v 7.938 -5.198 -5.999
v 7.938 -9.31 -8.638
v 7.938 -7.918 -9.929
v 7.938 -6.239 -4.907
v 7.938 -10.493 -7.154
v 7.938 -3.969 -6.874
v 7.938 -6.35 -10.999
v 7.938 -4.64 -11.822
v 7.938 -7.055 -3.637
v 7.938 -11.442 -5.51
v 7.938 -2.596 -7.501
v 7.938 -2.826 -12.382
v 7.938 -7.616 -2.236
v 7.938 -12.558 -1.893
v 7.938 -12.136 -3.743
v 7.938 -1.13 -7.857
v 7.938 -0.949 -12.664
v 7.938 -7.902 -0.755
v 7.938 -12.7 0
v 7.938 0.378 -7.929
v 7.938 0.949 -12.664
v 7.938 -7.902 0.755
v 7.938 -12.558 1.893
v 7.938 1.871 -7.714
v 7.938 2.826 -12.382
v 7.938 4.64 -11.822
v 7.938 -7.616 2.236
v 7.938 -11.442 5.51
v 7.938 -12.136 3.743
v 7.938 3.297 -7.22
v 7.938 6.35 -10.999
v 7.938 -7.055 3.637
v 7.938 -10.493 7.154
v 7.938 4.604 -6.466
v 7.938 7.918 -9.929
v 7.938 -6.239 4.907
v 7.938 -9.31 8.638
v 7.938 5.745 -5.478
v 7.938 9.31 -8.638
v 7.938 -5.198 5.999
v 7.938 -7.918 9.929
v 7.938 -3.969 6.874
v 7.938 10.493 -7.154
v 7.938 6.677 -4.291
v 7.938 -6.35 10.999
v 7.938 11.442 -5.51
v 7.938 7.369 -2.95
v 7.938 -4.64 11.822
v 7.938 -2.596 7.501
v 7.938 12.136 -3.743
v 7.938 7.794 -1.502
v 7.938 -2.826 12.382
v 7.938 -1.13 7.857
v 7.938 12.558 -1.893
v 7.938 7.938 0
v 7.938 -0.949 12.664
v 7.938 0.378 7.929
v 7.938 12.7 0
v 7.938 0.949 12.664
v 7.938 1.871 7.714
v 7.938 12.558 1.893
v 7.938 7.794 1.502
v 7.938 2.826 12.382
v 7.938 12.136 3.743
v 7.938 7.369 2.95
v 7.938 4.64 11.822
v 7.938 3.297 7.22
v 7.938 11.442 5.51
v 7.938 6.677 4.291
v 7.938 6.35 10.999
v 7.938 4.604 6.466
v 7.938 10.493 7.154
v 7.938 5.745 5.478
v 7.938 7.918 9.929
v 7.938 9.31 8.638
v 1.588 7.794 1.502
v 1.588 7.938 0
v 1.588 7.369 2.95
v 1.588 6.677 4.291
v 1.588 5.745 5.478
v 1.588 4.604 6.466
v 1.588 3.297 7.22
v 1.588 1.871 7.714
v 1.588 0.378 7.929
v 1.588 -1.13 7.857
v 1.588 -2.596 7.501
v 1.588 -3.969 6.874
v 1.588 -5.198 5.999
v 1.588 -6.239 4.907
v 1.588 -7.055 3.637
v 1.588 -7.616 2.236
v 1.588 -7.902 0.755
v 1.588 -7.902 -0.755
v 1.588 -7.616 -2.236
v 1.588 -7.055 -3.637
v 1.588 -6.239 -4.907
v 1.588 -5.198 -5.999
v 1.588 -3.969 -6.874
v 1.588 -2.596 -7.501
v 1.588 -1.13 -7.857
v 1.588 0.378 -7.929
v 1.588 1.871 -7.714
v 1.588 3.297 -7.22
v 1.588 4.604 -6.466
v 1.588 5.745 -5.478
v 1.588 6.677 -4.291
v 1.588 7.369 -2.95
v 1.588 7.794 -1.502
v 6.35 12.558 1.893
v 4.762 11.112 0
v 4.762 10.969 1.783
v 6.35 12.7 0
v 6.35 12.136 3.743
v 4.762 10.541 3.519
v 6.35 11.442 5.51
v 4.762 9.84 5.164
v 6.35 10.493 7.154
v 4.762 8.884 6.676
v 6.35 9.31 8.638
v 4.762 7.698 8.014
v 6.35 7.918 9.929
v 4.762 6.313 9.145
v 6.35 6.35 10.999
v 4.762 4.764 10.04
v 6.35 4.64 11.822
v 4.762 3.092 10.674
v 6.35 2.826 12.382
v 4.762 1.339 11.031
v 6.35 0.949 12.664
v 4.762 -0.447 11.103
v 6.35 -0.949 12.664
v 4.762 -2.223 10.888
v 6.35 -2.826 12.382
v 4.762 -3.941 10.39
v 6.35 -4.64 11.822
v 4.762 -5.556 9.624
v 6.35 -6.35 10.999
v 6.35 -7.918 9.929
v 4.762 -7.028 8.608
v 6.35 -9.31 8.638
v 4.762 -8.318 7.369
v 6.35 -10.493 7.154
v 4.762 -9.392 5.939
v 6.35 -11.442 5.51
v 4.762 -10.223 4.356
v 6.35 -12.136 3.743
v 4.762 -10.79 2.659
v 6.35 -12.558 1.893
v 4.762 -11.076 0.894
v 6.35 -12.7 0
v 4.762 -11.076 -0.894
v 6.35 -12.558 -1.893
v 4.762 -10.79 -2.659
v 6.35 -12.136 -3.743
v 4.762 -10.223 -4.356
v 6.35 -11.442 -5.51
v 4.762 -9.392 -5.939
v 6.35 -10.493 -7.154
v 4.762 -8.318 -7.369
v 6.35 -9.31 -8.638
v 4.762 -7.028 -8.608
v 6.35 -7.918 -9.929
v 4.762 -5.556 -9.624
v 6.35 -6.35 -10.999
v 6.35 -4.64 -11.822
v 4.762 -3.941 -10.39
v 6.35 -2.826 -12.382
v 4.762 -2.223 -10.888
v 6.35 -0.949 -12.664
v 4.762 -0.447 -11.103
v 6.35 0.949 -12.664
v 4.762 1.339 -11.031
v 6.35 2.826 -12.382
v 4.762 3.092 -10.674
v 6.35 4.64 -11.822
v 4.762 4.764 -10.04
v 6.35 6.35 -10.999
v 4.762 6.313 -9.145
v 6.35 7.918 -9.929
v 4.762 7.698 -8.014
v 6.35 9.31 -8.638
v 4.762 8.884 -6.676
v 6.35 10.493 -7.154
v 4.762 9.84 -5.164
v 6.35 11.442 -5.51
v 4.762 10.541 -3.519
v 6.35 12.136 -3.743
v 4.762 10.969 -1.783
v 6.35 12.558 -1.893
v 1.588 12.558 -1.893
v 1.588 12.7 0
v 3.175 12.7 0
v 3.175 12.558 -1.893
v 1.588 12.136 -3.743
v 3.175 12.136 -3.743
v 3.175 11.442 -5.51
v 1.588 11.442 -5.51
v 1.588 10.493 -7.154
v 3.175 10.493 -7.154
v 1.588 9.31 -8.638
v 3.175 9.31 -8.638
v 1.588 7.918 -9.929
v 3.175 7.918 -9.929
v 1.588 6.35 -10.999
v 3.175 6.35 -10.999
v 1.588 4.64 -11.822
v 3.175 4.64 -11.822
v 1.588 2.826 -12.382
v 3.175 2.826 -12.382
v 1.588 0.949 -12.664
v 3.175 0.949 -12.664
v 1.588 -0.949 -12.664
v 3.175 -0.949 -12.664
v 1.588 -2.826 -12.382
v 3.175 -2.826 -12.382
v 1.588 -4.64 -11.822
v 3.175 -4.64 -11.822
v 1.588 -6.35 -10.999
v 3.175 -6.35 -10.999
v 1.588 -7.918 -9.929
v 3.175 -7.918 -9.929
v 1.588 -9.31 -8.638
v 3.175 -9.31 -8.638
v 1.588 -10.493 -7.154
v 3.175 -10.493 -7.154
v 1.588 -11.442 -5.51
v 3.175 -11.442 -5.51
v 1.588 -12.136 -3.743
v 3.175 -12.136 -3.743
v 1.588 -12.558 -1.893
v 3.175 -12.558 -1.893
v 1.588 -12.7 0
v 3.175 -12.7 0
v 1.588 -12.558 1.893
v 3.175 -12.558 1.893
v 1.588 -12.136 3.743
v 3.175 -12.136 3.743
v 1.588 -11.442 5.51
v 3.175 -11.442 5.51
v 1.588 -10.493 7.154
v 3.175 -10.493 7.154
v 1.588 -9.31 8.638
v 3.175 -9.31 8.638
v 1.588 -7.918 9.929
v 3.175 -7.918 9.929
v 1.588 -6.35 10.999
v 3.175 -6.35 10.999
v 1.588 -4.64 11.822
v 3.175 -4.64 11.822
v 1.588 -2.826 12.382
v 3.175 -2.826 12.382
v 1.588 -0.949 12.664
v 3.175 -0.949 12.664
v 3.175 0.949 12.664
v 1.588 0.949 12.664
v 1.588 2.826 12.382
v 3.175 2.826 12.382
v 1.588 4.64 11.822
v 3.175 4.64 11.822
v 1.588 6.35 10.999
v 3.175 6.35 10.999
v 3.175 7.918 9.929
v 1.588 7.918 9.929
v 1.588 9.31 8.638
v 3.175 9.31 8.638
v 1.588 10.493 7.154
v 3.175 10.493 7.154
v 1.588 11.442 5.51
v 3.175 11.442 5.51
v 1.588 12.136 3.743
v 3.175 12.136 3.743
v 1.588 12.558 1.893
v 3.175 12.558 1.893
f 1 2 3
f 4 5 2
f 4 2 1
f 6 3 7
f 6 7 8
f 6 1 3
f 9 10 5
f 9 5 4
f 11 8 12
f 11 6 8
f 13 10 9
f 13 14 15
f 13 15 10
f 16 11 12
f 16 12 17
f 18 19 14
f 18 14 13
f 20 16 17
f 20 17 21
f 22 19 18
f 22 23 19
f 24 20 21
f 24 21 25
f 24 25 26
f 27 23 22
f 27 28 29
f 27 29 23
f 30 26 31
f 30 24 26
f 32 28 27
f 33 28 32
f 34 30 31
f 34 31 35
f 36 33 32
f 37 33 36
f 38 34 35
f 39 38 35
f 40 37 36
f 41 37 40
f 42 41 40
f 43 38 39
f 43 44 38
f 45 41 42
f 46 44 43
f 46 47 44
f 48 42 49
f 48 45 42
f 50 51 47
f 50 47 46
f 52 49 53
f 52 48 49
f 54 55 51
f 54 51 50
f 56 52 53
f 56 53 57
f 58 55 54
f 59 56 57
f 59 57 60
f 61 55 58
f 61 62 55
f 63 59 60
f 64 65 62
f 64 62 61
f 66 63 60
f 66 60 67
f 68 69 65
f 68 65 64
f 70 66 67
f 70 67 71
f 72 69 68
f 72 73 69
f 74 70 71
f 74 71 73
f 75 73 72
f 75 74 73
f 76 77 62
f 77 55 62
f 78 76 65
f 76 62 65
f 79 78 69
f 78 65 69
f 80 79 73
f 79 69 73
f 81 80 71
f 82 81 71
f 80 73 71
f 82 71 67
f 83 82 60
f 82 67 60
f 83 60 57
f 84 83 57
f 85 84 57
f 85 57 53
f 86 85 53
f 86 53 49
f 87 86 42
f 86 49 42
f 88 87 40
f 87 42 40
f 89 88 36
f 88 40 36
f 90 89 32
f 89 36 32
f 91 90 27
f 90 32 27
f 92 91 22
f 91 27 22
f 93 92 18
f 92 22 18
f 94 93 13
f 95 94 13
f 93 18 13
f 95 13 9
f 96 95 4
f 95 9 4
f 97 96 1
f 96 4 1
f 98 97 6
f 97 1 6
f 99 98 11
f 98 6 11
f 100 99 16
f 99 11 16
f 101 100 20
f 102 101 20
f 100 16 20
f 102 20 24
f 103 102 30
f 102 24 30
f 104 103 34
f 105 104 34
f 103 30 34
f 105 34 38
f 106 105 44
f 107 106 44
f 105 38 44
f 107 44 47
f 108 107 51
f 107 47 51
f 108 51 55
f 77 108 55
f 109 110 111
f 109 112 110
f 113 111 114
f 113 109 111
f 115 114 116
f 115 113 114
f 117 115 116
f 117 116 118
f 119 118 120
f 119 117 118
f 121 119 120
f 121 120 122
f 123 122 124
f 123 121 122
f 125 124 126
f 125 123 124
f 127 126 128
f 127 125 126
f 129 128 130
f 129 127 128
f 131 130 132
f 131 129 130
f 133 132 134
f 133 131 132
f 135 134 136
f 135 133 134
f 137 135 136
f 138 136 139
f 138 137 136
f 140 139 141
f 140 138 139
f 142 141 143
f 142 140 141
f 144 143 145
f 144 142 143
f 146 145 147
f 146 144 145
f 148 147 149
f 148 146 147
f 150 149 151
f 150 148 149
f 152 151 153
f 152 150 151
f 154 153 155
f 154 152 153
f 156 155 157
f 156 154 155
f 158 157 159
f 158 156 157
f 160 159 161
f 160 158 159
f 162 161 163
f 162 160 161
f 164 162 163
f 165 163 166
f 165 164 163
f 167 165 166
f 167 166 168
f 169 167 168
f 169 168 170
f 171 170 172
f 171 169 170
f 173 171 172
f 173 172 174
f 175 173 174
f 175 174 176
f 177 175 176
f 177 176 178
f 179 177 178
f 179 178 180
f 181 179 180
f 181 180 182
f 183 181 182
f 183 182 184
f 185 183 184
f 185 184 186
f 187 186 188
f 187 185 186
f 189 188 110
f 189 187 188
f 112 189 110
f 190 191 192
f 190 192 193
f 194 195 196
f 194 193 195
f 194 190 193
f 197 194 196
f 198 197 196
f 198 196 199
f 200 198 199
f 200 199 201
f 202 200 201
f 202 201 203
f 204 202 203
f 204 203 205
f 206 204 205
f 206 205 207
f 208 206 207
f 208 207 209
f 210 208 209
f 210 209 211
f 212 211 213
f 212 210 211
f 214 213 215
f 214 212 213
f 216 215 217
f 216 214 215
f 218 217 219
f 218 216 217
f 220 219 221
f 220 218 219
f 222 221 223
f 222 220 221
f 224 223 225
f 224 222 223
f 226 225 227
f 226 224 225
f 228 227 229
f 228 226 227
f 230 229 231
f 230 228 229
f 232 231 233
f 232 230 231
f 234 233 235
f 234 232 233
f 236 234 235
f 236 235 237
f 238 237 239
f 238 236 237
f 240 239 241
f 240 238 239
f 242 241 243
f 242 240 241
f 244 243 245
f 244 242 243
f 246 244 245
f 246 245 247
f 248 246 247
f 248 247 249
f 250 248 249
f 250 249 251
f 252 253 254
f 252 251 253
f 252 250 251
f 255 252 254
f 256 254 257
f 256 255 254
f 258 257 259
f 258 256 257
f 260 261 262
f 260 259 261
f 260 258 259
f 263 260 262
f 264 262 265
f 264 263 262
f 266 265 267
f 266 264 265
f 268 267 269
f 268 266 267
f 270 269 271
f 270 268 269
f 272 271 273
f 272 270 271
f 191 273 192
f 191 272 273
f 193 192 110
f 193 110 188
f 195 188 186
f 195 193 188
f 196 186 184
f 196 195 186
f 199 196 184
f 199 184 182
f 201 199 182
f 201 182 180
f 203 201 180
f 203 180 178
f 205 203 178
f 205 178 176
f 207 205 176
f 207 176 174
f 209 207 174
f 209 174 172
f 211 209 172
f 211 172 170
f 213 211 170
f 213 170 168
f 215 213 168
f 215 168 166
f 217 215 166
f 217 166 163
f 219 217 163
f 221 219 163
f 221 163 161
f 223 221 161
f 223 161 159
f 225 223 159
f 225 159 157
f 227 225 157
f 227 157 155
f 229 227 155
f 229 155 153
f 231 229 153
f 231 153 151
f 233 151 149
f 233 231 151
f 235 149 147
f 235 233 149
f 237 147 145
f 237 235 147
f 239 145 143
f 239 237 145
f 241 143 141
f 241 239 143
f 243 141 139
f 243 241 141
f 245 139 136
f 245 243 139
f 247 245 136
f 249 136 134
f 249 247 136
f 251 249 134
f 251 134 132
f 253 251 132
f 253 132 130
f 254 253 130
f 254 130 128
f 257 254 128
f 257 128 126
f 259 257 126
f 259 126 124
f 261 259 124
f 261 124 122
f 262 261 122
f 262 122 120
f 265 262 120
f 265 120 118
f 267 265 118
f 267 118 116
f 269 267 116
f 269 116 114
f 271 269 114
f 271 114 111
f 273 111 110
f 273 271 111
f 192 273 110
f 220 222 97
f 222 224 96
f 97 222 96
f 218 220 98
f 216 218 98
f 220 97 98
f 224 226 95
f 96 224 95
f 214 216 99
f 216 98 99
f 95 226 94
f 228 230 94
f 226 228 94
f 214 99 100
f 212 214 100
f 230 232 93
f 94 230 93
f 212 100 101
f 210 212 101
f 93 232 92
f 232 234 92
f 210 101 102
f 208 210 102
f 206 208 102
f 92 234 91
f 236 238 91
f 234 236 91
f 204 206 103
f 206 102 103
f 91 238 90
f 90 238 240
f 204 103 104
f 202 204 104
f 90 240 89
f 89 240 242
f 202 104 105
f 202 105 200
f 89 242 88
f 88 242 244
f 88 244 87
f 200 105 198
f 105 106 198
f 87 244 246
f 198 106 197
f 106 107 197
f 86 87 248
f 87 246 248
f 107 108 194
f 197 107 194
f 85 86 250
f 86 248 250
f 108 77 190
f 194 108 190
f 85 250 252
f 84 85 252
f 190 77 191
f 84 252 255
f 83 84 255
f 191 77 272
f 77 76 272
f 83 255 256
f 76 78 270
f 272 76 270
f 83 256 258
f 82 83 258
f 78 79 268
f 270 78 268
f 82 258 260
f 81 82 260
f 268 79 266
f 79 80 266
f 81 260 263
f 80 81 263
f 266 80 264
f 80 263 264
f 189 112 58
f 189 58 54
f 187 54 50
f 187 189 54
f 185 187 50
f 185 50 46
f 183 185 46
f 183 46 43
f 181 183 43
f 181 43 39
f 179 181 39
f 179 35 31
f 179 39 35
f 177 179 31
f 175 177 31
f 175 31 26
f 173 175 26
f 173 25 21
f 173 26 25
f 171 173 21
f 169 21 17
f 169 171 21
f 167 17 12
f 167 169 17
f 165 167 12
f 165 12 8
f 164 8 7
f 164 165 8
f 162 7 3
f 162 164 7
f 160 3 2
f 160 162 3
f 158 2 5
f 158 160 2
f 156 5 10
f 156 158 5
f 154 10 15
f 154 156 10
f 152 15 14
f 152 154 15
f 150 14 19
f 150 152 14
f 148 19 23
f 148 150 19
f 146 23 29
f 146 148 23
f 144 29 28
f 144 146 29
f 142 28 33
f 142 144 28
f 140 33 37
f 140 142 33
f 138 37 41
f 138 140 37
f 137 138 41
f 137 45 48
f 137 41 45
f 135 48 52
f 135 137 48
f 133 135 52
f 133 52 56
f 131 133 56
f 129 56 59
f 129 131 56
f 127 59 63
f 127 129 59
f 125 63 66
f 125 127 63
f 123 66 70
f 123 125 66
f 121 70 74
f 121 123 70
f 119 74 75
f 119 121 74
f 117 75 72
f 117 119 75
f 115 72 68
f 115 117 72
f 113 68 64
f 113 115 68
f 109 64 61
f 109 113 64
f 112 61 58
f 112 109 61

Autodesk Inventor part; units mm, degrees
ref_plane "YZ Plane" through (0, 0, 0) normal (1, 0, 0) x (0, 1, 0)
ref_plane "XZ Plane" through (0, 0, 0) normal (0, 1, 0) x (-1, 0, 0)
ref_plane "XY Plane" through (0, 0, 0) normal (0, 0, 1) x (1, 0, 0)
sketch "Sketch1" plane through (0, 0, 0) normal (0, 0, 1) x (1, 0, 0)
  line L0 (0, 0) -> (9.525, 0) construction
  line L1 (1.5875, 7.9375) -> (7.9375, 7.9375)
  line L2 (7.9375, 7.9375) -> (7.9375, 12.7)
  line L3 (1.5875, 12.7) -> (1.5875, 7.9375)
  line L4 (3.175, 12.7) -> (4.7625, 11.1125)
  line L5 (4.7625, 11.1125) -> (6.35, 12.7)
  line L6 (7.9375, 12.7) -> (6.35, 12.7)
  line L7 (3.175, 12.7) -> (1.5875, 12.7)
  line L8 (1.5875, 7.9375) -> (0, 7.9375)
  line L9 (0, 7.9375) -> (0, 6.6675)
  line L10 (0, 6.6675) -> (0.635, 6.6675)
  line L11 (0.635, 6.6675) -> (0.635, 5.08)
  line L12 (0.635, 5.08) -> (0, 5.08)
  line L13 (0, 5.08) -> (0, 2.54)
  line L14 (0, 2.54) -> (9.525, 2.54)
  line L15 (9.525, 2.54) -> (9.525, 5.08)
  line L16 (9.525, 5.08) -> (8.89, 5.08)
  line L17 (8.89, 5.08) -> (8.89, 6.6675)
  line L18 (8.89, 6.6675) -> (9.525, 6.6675)
  line L19 (9.525, 6.6675) -> (9.525, 7.9375)
  line L20 (9.525, 7.9375) -> (7.9375, 7.9375)
  point P0 (4.7625, 7.9375)
  dimension "d0" = 6.35
  dimension "d1" = 4.7625
  dimension "d2" = 1.5875
  dimension "d3" = 7.9375
  dimension "d5" = 11.1125
  dimension "d6" = 9.525
  dimension "d7" = 1.27
  dimension "d8" = 1.5875
  dimension "d9" = 2.54
  dimension "d10" = 0.635
revolve "Revolution1" add sketch "Sketch1" angle 360 about axis through (0, 0, 0) along (1, 0, 0) contours L3 L7 L4 L5 L6 L2 L1
properties part number "8 ball cable roller"
